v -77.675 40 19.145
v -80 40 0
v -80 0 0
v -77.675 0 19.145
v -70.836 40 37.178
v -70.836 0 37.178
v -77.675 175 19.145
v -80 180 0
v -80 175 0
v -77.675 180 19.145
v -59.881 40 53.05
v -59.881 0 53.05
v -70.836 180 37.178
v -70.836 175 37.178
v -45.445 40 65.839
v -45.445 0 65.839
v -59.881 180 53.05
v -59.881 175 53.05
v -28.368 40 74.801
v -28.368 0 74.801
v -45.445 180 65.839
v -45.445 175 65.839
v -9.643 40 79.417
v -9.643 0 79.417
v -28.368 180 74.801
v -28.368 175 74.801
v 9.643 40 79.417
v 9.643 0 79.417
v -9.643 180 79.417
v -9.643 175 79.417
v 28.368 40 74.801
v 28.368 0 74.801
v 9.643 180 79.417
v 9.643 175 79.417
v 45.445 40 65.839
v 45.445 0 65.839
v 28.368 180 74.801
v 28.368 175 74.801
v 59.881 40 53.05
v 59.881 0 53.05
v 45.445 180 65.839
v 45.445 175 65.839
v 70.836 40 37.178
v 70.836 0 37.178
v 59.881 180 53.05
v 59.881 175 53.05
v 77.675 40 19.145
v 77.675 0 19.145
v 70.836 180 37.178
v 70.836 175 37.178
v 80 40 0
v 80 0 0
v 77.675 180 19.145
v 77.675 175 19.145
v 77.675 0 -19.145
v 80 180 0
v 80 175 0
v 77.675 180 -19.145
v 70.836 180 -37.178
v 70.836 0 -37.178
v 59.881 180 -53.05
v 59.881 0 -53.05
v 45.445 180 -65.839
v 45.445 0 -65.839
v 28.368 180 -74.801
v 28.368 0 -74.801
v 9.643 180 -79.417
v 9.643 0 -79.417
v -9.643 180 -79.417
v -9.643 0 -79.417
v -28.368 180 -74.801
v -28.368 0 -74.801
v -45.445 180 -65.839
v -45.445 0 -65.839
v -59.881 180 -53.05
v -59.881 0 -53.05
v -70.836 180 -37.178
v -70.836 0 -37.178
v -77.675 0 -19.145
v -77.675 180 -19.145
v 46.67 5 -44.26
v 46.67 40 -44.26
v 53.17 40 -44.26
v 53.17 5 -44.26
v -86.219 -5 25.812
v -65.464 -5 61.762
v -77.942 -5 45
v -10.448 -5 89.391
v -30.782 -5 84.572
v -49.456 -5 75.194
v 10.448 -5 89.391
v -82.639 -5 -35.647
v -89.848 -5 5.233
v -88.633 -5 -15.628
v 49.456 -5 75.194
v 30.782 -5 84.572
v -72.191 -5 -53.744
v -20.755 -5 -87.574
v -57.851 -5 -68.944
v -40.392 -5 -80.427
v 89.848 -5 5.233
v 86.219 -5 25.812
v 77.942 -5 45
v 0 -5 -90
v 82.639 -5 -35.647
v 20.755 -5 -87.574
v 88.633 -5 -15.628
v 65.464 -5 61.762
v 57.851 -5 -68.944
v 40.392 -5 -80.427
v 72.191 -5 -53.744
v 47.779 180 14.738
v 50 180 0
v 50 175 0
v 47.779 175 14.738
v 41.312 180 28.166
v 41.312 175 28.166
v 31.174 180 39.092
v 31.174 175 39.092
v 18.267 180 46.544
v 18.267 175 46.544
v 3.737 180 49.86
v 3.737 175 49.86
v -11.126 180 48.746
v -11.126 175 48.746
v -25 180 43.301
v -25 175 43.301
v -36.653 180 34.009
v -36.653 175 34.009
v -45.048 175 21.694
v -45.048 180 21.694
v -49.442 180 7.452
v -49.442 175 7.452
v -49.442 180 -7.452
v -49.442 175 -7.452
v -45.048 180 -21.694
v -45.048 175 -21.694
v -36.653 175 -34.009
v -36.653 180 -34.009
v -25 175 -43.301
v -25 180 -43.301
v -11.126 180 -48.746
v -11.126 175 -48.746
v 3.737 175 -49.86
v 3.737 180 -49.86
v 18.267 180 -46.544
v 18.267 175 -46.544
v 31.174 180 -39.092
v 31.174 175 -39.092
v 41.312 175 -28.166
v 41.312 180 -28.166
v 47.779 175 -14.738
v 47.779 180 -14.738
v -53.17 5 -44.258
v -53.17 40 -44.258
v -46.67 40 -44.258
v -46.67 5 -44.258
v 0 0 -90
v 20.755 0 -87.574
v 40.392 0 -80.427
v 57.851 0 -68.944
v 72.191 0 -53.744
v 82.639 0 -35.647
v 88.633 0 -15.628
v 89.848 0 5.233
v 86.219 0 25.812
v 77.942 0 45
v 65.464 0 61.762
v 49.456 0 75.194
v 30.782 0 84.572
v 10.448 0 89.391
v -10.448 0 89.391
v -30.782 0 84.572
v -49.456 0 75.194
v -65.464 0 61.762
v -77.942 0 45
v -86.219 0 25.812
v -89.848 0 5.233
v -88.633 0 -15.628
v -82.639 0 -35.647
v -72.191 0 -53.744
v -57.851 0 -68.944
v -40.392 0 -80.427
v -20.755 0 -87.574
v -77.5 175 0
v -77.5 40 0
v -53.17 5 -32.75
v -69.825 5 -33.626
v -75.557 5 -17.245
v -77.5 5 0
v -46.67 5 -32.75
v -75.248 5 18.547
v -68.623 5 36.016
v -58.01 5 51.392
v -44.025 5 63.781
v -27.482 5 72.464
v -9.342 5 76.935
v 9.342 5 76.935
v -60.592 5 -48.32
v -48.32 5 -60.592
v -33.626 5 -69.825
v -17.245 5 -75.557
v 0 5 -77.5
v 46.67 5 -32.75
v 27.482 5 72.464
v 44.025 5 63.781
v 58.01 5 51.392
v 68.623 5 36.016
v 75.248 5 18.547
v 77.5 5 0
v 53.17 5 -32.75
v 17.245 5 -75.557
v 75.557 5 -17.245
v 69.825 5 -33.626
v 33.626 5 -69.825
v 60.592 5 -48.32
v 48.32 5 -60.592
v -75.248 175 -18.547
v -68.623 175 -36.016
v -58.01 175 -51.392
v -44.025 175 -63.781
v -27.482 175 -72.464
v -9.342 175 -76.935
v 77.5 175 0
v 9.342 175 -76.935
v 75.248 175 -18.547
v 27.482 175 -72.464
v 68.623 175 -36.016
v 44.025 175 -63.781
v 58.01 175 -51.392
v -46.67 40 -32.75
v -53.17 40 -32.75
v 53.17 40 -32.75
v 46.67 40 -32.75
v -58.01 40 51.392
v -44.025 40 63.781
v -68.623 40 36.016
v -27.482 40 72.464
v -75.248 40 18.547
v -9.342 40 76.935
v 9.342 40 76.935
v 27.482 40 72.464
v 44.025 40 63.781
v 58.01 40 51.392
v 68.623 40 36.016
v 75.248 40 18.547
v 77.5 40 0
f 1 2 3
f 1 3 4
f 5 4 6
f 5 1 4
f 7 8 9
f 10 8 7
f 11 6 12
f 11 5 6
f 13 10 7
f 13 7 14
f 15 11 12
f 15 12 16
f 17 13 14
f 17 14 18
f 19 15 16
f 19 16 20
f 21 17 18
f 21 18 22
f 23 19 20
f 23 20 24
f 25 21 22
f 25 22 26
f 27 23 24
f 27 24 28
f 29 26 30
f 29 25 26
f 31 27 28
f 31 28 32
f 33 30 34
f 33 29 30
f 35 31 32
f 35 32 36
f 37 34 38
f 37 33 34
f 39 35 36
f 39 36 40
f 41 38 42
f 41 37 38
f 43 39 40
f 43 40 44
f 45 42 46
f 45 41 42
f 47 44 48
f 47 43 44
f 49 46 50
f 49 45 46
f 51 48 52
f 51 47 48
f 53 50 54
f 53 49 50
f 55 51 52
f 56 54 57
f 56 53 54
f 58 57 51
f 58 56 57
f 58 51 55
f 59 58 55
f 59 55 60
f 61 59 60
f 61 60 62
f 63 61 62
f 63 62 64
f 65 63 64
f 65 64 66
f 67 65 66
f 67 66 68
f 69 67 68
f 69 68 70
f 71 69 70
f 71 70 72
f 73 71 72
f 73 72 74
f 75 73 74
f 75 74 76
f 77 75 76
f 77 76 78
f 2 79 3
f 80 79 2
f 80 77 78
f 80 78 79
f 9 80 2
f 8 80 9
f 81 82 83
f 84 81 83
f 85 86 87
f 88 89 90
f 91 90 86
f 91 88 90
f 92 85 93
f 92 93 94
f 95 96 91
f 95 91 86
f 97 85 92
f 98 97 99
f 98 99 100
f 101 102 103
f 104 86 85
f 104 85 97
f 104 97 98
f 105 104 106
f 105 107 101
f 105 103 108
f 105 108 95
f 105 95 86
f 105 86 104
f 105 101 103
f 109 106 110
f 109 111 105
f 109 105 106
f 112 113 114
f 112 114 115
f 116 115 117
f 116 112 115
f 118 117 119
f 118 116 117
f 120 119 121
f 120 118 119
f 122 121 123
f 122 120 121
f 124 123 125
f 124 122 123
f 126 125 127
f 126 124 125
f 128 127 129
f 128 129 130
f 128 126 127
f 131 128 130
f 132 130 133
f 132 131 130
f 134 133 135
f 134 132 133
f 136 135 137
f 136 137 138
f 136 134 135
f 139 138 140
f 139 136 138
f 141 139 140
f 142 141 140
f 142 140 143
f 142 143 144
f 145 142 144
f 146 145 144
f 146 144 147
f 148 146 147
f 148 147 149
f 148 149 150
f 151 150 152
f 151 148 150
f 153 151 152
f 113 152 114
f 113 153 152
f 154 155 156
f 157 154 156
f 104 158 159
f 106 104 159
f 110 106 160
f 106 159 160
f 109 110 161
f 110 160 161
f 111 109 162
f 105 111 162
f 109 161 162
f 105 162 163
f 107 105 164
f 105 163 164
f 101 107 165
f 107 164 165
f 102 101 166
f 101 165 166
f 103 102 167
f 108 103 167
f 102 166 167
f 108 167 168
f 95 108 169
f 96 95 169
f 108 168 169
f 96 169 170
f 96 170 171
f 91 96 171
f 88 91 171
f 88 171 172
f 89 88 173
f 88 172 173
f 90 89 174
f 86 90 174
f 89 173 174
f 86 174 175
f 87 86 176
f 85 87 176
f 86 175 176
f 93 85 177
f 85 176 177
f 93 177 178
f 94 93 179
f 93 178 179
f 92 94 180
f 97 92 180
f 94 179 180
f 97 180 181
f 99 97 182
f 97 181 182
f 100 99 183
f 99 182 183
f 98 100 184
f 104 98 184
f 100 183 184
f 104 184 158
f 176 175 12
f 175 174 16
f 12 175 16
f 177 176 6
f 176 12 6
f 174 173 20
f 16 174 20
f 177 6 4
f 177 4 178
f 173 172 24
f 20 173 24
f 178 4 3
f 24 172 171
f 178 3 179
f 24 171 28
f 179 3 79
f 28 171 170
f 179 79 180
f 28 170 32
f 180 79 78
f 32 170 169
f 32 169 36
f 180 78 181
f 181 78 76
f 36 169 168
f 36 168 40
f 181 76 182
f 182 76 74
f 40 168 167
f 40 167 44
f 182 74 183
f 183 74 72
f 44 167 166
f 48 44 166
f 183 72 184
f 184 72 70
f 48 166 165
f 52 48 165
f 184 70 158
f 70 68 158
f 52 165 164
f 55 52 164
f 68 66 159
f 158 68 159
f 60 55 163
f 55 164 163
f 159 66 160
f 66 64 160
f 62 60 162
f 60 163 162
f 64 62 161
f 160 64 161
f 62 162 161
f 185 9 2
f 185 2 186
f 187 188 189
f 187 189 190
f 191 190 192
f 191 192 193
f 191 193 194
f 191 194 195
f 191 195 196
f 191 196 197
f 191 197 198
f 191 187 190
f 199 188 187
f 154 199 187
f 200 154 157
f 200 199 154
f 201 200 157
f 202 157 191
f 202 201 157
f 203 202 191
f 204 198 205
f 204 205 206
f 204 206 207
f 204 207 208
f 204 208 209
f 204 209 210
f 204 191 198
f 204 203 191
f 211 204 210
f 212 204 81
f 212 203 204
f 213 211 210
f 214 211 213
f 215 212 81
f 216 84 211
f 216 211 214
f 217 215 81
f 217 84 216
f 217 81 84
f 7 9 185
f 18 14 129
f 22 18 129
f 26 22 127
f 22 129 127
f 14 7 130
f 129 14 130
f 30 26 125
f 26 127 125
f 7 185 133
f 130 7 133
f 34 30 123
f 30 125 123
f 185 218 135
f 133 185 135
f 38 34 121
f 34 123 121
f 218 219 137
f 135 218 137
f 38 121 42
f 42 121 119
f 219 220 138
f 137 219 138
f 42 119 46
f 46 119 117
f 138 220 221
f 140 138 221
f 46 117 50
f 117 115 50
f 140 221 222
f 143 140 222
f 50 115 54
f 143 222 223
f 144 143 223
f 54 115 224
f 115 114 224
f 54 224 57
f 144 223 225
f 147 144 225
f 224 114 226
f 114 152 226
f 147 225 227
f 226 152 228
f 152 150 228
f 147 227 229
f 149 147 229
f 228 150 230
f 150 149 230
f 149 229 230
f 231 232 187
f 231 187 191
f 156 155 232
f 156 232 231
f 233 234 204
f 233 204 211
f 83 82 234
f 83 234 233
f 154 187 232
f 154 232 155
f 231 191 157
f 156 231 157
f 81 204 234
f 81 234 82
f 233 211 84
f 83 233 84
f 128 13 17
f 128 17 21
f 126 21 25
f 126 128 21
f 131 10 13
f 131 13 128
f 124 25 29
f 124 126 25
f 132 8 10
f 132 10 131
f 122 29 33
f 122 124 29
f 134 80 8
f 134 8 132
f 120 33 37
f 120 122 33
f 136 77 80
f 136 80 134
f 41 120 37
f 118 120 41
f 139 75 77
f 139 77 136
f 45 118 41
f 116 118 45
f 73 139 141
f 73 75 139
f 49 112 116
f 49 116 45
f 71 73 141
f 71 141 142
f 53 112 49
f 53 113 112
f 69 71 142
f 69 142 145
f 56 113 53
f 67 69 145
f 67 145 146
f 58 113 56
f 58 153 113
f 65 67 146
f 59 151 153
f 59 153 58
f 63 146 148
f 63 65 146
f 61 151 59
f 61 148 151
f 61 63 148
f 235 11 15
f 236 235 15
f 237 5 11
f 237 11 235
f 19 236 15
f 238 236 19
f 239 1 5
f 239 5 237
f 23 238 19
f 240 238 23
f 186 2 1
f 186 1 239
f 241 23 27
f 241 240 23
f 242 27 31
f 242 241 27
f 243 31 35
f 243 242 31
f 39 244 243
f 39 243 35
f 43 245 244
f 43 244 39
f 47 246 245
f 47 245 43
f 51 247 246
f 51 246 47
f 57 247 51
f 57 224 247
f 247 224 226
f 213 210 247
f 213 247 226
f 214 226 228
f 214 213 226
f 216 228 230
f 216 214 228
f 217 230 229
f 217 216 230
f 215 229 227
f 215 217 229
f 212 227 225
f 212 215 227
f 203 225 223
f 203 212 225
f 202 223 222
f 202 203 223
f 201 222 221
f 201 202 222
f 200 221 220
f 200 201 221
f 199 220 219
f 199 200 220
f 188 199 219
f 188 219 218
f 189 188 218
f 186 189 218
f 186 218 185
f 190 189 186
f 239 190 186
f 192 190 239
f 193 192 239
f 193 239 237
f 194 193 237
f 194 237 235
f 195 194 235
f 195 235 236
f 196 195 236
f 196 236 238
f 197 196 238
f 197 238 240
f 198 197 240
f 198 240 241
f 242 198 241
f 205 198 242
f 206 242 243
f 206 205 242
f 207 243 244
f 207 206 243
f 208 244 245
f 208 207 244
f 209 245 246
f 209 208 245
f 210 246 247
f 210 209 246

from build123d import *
from build123d.topology import SkipClean

# Parameters (mm, degrees)
BOSS_EXTRU_1_DEPTH      = 5
BOSS_EXTRU_2_DEPTH      = 180
BOSS_EXTRU_3_DEPTH      = 5
ENL_V_MAT_EXTRU_1_DEPTH = 5
BOSS_EXTRU_4_DEPTH      = 40
BOSS_EXTRU_5_DEPTH      = 5
ESQUISSE8_R             = 90
BOSS_EXTRU_6_DEPTH      = 5
BOSS_EXTRU_7_DEPTH      = 5
BOSS_EXTRU_8_DEPTH      = 5
ESQUISSE12_W            = 6.5
ESQUISSE12_H            = 11.508229801
ESQUISSE12_H_2          = 11.51
BOSS_EXTRU_9_DEPTH      = 35


with BuildPart() as part:
    # Esquisse1 → Boss.-Extru.1 (new body)
    with BuildSketch(Plane(origin=(0, 0, 0), x_dir=(1, 0, 0), z_dir=(0, 1, 0))):
        with BuildLine():
            ThreePointArc((0, 77.5), (-54.800775542, 54.800775542), (-77.5, 0))
            Line((-77.5, 0), (0, 0))
            Line((0, 0), (77.5, 0))
            ThreePointArc((77.5, 0), (54.800775542, 54.800775542), (0, 77.5))
        make_face()
    extrude(amount=BOSS_EXTRU_1_DEPTH)

    # Esquisse2 → Boss.-Extru.2 (add)
    with BuildSketch(Plane.XZ):
        with BuildLine():
            Line((80, 0), (77.5, 0))
            ThreePointArc((77.5, 0), (0, -77.5), (-77.5, 0))
            Line((-77.5, 0), (-80, 0))
            ThreePointArc((-80, 0), (0, -80), (80, 0))
        make_face()
    extrude(amount=-BOSS_EXTRU_2_DEPTH)

    # Esquisse4 → Boss.-Extru.3 (add)
    with BuildSketch(Plane(origin=(0, 180, 0), x_dir=(1, 0, 0), z_dir=(0, 1, 0))):
        with BuildLine():
            Line((-77.5, 0), (77.5, 0))
            ThreePointArc((77.5, 0), (0, 77.5), (-77.5, 0))
        make_face()
    extrude(amount=-BOSS_EXTRU_3_DEPTH)

    # Esquisse5 → Enlèv. mat.-Extru.1 (cut)
    with BuildSketch(Plane(origin=(0, 180, 0), x_dir=(1, 0, 0), z_dir=(0, 1, 0))):
        with BuildLine():
            Line((-50, 0), (50, 0))
            ThreePointArc((50, 0), (0, 50), (-50, 0))
        make_face()
    extrude(amount=-ENL_V_MAT_EXTRU_1_DEPTH, mode=Mode.SUBTRACT)

    # Esquisse6 → Boss.-Extru.4 (add)
    with SkipClean():  # the faces are left unmerged after this step: merging them gives an invalid solid
        with BuildSketch(Plane(origin=(0, 0, 0), x_dir=(1, 0, 0), z_dir=(0, 1, 0))):
            with BuildLine():
                Line((80, 0), (77.5, 0))
                ThreePointArc((77.5, 0), (0, -77.5), (-77.5, 0))
                Line((-77.5, 0), (-80, 0))
                ThreePointArc((-80, 0), (0, -80), (80, 0))
            make_face()
        extrude(amount=BOSS_EXTRU_4_DEPTH)

    # Esquisse7 → Boss.-Extru.5 (add)
    with BuildSketch(Plane(origin=(0, 0, 0), x_dir=(1, 0, 0), z_dir=(0, 1, 0))):
        with BuildLine():
            Line((0, 0), (-77.5, 0))
            ThreePointArc((-77.5, 0), (0, -77.5), (77.5, 0))
            Line((77.5, 0), (0, 0))
        make_face()
    extrude(amount=BOSS_EXTRU_5_DEPTH)

    # Esquisse8 → Boss.-Extru.6 (add)
    with BuildSketch(Plane.XZ):
        with Locations(Location((0, 0, 0), (0, 0, 270))):
            Circle(ESQUISSE8_R)
    extrude(amount=BOSS_EXTRU_6_DEPTH)



with BuildPart() as body_2:
    # Esquisse9 → Boss.-Extru.7 (new body)
    with BuildSketch(Plane(origin=(0, 180, 0), x_dir=(1, 0, 0), z_dir=(0, 1, 0))):
        with BuildLine():
            Line((80, 0), (77.5, 0))
            ThreePointArc((77.5, 0), (0, -77.5), (-77.5, 0))
            Line((-77.5, 0), (-80, 0))
            ThreePointArc((-80, 0), (0, -80), (80, 0))
        make_face()
    extrude(amount=-BOSS_EXTRU_7_DEPTH)


with BuildPart() as part_1:
    add(part.part)

    add(body_2.part)  # Boss.-Extru.8 merges body 2
    # Esquisse10 → Boss.-Extru.8 (add)
    with BuildSketch(Plane(origin=(0, 180, 0), x_dir=(1, 0, 0), z_dir=(0, 1, 0))):
        with BuildLine():
            ThreePointArc((-77.5, 0), (0, -77.5), (77.5, 0))
            Line((77.5, 0), (50, 0))
            ThreePointArc((50, 0), (0, -50), (-50, 0))
            Line((-50, 0), (-77.5, 0))
        make_face()
    extrude(amount=-BOSS_EXTRU_8_DEPTH)

    # Esquisse12 → Boss.-Extru.9 (add)
    with BuildSketch(Plane(origin=(0, 5, 0), x_dir=(1, 0, 0), z_dir=(0, 1, 0))):
        with Locations((-49.92, 38.5041149)):
            Rectangle(ESQUISSE12_W, ESQUISSE12_H)
        with Locations((49.92, 38.505)):
            Rectangle(ESQUISSE12_W, ESQUISSE12_H_2)
    extrude(amount=BOSS_EXTRU_9_DEPTH)


solid = part_1.part
